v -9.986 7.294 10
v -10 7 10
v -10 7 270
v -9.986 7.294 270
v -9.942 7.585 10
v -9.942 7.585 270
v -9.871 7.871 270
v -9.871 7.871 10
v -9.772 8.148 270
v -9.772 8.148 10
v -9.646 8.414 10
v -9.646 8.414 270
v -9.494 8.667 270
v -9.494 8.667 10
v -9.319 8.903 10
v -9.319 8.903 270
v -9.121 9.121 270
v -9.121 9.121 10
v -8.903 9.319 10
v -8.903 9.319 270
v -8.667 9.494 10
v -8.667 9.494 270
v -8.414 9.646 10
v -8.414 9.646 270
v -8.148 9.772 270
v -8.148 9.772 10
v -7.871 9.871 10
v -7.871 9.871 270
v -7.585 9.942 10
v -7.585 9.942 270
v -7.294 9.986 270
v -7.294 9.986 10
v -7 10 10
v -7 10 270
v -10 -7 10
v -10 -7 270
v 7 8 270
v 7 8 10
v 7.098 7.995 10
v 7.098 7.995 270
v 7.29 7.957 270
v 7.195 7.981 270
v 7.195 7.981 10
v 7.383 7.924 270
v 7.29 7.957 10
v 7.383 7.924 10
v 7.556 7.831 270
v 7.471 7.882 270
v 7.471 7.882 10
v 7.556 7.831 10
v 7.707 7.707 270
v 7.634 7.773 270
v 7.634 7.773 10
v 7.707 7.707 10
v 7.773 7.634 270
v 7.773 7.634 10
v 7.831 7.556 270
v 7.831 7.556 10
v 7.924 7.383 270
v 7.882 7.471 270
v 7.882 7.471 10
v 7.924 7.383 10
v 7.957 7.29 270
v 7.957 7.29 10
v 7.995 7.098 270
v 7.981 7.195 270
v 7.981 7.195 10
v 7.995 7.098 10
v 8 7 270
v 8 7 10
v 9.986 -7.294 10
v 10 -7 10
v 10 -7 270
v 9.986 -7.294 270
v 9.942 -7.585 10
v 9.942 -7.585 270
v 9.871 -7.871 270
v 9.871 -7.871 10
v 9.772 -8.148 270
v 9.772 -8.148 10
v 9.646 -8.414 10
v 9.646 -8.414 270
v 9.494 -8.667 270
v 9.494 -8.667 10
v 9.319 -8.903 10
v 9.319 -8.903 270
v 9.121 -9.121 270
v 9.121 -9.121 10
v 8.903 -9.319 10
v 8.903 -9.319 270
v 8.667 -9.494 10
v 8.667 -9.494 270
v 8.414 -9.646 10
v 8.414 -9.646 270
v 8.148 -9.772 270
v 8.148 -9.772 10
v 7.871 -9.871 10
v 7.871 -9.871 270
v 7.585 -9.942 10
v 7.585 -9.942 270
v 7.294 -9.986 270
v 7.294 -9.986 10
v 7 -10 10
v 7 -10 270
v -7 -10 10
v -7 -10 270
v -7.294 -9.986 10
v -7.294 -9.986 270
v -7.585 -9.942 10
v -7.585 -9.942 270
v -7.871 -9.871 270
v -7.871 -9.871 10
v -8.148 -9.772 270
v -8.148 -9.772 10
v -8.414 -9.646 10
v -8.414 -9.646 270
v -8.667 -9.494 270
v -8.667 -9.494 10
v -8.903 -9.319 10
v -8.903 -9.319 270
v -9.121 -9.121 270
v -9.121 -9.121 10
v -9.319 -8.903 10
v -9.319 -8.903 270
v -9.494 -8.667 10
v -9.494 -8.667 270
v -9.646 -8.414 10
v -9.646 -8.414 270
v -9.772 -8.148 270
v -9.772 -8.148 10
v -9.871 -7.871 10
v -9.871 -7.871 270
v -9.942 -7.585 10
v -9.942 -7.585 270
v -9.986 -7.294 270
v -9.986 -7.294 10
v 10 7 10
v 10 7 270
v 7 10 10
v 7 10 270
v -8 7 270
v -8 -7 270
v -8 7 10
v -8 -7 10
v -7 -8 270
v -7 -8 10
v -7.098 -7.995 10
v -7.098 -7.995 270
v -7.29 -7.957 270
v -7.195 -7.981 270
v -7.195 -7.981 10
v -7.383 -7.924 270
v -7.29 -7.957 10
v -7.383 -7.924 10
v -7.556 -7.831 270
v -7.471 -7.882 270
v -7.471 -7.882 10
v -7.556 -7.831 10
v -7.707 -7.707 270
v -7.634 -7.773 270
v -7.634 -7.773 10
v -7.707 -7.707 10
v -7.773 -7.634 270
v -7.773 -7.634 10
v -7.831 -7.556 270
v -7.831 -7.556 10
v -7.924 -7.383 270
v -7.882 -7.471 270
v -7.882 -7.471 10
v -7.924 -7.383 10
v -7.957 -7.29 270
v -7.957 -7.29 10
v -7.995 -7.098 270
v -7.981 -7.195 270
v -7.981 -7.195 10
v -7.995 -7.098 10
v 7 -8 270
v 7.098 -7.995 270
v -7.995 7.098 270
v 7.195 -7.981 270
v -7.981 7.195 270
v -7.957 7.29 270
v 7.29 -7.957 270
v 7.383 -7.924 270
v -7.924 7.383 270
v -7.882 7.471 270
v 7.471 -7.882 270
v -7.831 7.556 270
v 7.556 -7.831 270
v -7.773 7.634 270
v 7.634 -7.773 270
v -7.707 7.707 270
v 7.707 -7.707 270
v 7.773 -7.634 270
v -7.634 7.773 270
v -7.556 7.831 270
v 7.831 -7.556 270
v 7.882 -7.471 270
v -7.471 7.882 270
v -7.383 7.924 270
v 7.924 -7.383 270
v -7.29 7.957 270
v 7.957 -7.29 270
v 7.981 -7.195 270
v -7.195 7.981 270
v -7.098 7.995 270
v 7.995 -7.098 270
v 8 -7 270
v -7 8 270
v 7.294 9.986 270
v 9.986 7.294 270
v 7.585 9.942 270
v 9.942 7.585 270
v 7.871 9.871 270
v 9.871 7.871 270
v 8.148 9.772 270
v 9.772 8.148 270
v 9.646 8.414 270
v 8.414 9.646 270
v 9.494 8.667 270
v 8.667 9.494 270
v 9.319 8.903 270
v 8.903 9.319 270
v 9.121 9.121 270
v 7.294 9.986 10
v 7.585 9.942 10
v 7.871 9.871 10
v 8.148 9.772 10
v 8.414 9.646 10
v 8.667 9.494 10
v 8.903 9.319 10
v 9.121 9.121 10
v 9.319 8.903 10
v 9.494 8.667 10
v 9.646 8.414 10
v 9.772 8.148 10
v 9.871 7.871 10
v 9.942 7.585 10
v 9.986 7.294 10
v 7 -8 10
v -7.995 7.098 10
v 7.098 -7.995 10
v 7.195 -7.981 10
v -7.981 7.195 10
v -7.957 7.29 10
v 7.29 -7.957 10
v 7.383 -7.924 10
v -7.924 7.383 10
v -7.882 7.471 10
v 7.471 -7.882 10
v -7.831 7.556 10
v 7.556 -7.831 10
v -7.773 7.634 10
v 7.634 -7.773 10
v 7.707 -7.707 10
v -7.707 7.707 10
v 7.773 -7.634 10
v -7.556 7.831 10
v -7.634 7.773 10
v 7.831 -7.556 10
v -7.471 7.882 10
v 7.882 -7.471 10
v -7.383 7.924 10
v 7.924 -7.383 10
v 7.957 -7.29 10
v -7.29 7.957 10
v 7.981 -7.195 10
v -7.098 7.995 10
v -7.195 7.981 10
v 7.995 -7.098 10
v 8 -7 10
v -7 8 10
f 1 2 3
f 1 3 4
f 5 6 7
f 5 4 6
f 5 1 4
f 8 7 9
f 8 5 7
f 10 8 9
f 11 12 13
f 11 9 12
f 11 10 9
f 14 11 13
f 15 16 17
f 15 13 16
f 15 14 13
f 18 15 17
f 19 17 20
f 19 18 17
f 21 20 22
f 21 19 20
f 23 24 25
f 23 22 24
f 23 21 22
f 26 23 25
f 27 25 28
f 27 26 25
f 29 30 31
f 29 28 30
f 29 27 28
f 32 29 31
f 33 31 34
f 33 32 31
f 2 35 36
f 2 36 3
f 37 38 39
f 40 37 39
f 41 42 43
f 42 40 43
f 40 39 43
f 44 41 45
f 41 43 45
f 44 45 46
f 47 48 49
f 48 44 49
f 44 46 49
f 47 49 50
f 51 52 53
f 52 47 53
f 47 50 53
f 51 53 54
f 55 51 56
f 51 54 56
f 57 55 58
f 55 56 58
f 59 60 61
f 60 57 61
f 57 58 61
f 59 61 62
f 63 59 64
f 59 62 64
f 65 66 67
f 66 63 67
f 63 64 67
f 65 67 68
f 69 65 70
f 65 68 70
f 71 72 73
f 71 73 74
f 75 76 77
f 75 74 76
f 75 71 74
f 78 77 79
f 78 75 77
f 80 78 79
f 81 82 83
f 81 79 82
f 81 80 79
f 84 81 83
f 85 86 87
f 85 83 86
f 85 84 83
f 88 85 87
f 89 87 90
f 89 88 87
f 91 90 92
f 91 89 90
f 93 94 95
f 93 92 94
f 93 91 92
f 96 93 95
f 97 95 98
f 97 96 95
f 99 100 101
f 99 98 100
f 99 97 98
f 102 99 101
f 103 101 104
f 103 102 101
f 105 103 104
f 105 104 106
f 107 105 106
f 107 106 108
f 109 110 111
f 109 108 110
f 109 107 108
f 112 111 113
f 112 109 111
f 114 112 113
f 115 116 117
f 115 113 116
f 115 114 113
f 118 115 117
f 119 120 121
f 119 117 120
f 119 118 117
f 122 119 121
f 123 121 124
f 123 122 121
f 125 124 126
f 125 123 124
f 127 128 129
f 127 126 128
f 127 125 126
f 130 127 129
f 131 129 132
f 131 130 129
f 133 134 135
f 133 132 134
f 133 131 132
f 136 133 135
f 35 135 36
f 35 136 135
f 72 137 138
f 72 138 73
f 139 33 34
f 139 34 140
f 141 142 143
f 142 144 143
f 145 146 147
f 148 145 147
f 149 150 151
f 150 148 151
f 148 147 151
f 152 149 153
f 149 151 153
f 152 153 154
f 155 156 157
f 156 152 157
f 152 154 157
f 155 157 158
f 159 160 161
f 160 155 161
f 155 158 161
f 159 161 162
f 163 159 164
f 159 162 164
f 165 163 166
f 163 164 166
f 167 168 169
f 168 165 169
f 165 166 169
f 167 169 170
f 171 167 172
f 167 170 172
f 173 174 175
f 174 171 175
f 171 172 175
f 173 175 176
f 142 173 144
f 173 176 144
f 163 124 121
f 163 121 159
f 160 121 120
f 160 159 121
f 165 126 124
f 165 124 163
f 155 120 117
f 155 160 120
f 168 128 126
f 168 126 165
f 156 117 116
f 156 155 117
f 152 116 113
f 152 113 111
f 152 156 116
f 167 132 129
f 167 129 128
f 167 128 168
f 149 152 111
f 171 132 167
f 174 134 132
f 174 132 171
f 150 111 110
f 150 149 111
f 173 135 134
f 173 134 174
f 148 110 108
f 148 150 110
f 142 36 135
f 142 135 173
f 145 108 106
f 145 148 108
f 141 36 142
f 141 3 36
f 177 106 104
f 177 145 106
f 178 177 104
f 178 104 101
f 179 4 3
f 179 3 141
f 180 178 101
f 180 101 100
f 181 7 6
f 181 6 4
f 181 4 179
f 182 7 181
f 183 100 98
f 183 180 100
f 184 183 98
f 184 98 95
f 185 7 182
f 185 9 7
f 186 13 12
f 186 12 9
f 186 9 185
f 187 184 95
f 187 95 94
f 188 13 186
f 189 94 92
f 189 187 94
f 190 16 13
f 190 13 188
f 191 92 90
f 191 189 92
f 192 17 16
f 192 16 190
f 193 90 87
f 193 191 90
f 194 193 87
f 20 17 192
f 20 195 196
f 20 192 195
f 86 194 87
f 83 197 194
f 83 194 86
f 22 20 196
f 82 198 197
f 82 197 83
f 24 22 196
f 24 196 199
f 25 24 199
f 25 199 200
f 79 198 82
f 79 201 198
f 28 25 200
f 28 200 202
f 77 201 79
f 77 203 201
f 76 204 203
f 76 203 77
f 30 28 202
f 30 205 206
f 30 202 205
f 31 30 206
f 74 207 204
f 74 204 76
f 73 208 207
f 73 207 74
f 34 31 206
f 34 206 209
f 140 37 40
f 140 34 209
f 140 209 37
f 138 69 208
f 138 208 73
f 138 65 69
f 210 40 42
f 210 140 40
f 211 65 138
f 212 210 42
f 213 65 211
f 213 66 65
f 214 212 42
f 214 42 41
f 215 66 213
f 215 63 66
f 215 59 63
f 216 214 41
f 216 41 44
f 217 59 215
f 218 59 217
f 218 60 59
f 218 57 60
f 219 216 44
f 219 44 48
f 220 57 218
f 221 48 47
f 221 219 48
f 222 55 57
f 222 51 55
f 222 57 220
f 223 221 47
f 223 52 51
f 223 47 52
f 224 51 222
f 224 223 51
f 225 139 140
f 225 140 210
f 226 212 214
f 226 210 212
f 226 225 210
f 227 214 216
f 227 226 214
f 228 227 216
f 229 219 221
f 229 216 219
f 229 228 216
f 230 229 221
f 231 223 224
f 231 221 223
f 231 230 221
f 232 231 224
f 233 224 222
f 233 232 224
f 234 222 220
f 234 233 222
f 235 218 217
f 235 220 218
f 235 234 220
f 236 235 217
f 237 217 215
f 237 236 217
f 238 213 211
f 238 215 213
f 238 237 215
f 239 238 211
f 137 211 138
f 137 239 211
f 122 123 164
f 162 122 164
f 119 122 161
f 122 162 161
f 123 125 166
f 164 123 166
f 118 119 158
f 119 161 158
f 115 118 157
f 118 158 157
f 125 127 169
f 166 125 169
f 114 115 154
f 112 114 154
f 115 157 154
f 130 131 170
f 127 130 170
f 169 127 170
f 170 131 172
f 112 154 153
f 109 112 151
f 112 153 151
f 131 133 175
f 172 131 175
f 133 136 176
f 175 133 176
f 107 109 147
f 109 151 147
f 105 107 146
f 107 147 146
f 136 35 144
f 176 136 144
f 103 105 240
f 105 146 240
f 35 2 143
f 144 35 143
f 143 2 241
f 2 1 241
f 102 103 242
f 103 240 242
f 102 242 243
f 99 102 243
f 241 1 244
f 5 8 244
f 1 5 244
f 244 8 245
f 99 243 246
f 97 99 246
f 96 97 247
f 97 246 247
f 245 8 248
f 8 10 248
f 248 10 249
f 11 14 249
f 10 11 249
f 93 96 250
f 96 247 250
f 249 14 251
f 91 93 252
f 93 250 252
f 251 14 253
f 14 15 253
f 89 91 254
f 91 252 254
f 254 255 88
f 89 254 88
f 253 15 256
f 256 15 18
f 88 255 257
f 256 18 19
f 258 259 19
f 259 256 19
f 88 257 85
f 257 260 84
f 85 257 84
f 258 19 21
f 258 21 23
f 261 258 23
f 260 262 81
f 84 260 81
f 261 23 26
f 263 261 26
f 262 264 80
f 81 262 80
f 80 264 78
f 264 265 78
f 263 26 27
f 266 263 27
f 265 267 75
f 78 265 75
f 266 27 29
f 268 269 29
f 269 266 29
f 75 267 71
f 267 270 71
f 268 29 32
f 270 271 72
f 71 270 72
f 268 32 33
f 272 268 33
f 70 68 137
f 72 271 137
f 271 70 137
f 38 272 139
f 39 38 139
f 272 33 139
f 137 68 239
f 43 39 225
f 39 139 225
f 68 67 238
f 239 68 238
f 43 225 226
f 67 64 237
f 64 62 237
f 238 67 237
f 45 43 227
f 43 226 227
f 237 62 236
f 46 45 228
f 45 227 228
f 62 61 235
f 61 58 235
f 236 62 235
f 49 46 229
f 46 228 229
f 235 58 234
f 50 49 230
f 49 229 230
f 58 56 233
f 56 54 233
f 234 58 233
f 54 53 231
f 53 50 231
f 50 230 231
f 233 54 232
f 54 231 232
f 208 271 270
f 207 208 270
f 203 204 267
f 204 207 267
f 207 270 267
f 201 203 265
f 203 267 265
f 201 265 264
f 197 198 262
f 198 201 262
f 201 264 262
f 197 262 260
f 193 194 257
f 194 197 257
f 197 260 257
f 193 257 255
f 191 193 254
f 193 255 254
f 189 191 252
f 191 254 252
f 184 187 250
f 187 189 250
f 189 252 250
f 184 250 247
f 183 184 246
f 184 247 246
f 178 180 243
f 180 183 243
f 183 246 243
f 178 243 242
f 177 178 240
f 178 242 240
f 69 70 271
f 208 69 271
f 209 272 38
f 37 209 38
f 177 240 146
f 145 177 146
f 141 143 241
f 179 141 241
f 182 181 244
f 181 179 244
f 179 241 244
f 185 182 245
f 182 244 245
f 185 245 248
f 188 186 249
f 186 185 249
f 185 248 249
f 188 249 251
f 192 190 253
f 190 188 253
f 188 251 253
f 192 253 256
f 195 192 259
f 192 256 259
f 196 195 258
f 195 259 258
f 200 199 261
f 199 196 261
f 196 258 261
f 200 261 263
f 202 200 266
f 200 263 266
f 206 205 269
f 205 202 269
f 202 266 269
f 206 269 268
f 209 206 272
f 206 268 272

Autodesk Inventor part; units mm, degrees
ref_plane "Start Plane" through (0, 0, 10) normal (0, 0, 1) x (1, 0, 0)
ref_plane "End Plane" through (0, 0, 270) normal (0, 0, 1) x (1, 0, 0)
sketch "Sketch" plane through (0, 0, 0) normal (0, 0, 1) x (1, 0, 0)
  line L0 (-10, -7) -> (-10, 7)
  line L1 (-7, 10) -> (7, 10)
  line L2 (10, 7) -> (10, -7)
  line L3 (7, -10) -> (-7, -10)
  arc A0 (-10, -7) -> (-7, -10) centre (-7, -7) ccw
  arc A1 (-7, 10) -> (-10, 7) centre (-7, 7) ccw
  arc A2 (10, 7) -> (7, 10) centre (7, 7) ccw
  arc A3 (7, -10) -> (10, -7) centre (7, -7) ccw
  arc A4 (-7, 8) -> (-8, 7) centre (-7, 7) ccw
  line L4 (-7, 8) -> (7, 8)
  arc A5 (8, 7) -> (7, 8) centre (7, 7) ccw
  line L5 (8, 7) -> (8, -7)
  arc A6 (7, -8) -> (8, -7) centre (7, -7) ccw
  line L6 (7, -8) -> (-7, -8)
  arc A7 (-8, -7) -> (-7, -8) centre (-7, -7) ccw
  line L7 (-8, -7) -> (-8, 7)
  line L8 (0, 14.8698) -> (0, -14.8698) construction
  line L9 (-14.8698, 0) -> (14.8698, 0) construction
  dimension "d7" = 3
  dimension "d10" = 20
  dimension "d11" = 20
  dimension "d12" = 2
  dimension "d15" = 10
  dimension "d16" = 10
extrude "Body" add sketch "Sketch" along normal up to surface (260 mm away) from surface at 10
sketch "Sketch3" plane through (0, 0, 0) normal (0, 0, 1) x (1, 0, 0)
  line L0 (0, 0) -> (10, 0)
ref_plane "Work Plane3" through (0, 0, 0) normal (0, -1, 0) x (1, 0, 0)
sketch "Sketch4" plane through (0, 0, 0) normal (0, -1, 0) x (1, 0, 0)
  line L0 (-2, 10) -> (12, 10)
  line L1 (-2, 270) -> (12, 270)
  dimension "d18" = 260
ref_plane "Work Plane4" through (167.5, -7, 270) normal (0, 0, 1) x (1, 0, 0)
split "Split1" plane through (167.5, -7, 270) removes the side toward (0, 0, 1)
ref_plane "Work Plane5" through (-75, -7, 10) normal (0, 0, -1) x (-1, 0, 0)
split "Split2" plane through (-75, -7, 10) removes the side toward (0, 0, -1)
equation "\"d7\" = G_IR"
equation "\"d10\" = G_H"
equation "\"d11\" = G_W"
equation "\"d12\" = G_T"
equation "\"d15\" = 0.5 * d10"
equation "\"d16\" = 0.5 * d11"
equation "\"d3\" = G_L"
equation "\"G_W\" = 20"
equation "\"G_H\" = 20"
equation "\"G_T\" = 2"
equation "\"G_IR\" = 3"
equation "\"G_L\" = d18"
properties part number "ISO 12633-2 - 20x20x2 - 260" material "Steel, Mild"
